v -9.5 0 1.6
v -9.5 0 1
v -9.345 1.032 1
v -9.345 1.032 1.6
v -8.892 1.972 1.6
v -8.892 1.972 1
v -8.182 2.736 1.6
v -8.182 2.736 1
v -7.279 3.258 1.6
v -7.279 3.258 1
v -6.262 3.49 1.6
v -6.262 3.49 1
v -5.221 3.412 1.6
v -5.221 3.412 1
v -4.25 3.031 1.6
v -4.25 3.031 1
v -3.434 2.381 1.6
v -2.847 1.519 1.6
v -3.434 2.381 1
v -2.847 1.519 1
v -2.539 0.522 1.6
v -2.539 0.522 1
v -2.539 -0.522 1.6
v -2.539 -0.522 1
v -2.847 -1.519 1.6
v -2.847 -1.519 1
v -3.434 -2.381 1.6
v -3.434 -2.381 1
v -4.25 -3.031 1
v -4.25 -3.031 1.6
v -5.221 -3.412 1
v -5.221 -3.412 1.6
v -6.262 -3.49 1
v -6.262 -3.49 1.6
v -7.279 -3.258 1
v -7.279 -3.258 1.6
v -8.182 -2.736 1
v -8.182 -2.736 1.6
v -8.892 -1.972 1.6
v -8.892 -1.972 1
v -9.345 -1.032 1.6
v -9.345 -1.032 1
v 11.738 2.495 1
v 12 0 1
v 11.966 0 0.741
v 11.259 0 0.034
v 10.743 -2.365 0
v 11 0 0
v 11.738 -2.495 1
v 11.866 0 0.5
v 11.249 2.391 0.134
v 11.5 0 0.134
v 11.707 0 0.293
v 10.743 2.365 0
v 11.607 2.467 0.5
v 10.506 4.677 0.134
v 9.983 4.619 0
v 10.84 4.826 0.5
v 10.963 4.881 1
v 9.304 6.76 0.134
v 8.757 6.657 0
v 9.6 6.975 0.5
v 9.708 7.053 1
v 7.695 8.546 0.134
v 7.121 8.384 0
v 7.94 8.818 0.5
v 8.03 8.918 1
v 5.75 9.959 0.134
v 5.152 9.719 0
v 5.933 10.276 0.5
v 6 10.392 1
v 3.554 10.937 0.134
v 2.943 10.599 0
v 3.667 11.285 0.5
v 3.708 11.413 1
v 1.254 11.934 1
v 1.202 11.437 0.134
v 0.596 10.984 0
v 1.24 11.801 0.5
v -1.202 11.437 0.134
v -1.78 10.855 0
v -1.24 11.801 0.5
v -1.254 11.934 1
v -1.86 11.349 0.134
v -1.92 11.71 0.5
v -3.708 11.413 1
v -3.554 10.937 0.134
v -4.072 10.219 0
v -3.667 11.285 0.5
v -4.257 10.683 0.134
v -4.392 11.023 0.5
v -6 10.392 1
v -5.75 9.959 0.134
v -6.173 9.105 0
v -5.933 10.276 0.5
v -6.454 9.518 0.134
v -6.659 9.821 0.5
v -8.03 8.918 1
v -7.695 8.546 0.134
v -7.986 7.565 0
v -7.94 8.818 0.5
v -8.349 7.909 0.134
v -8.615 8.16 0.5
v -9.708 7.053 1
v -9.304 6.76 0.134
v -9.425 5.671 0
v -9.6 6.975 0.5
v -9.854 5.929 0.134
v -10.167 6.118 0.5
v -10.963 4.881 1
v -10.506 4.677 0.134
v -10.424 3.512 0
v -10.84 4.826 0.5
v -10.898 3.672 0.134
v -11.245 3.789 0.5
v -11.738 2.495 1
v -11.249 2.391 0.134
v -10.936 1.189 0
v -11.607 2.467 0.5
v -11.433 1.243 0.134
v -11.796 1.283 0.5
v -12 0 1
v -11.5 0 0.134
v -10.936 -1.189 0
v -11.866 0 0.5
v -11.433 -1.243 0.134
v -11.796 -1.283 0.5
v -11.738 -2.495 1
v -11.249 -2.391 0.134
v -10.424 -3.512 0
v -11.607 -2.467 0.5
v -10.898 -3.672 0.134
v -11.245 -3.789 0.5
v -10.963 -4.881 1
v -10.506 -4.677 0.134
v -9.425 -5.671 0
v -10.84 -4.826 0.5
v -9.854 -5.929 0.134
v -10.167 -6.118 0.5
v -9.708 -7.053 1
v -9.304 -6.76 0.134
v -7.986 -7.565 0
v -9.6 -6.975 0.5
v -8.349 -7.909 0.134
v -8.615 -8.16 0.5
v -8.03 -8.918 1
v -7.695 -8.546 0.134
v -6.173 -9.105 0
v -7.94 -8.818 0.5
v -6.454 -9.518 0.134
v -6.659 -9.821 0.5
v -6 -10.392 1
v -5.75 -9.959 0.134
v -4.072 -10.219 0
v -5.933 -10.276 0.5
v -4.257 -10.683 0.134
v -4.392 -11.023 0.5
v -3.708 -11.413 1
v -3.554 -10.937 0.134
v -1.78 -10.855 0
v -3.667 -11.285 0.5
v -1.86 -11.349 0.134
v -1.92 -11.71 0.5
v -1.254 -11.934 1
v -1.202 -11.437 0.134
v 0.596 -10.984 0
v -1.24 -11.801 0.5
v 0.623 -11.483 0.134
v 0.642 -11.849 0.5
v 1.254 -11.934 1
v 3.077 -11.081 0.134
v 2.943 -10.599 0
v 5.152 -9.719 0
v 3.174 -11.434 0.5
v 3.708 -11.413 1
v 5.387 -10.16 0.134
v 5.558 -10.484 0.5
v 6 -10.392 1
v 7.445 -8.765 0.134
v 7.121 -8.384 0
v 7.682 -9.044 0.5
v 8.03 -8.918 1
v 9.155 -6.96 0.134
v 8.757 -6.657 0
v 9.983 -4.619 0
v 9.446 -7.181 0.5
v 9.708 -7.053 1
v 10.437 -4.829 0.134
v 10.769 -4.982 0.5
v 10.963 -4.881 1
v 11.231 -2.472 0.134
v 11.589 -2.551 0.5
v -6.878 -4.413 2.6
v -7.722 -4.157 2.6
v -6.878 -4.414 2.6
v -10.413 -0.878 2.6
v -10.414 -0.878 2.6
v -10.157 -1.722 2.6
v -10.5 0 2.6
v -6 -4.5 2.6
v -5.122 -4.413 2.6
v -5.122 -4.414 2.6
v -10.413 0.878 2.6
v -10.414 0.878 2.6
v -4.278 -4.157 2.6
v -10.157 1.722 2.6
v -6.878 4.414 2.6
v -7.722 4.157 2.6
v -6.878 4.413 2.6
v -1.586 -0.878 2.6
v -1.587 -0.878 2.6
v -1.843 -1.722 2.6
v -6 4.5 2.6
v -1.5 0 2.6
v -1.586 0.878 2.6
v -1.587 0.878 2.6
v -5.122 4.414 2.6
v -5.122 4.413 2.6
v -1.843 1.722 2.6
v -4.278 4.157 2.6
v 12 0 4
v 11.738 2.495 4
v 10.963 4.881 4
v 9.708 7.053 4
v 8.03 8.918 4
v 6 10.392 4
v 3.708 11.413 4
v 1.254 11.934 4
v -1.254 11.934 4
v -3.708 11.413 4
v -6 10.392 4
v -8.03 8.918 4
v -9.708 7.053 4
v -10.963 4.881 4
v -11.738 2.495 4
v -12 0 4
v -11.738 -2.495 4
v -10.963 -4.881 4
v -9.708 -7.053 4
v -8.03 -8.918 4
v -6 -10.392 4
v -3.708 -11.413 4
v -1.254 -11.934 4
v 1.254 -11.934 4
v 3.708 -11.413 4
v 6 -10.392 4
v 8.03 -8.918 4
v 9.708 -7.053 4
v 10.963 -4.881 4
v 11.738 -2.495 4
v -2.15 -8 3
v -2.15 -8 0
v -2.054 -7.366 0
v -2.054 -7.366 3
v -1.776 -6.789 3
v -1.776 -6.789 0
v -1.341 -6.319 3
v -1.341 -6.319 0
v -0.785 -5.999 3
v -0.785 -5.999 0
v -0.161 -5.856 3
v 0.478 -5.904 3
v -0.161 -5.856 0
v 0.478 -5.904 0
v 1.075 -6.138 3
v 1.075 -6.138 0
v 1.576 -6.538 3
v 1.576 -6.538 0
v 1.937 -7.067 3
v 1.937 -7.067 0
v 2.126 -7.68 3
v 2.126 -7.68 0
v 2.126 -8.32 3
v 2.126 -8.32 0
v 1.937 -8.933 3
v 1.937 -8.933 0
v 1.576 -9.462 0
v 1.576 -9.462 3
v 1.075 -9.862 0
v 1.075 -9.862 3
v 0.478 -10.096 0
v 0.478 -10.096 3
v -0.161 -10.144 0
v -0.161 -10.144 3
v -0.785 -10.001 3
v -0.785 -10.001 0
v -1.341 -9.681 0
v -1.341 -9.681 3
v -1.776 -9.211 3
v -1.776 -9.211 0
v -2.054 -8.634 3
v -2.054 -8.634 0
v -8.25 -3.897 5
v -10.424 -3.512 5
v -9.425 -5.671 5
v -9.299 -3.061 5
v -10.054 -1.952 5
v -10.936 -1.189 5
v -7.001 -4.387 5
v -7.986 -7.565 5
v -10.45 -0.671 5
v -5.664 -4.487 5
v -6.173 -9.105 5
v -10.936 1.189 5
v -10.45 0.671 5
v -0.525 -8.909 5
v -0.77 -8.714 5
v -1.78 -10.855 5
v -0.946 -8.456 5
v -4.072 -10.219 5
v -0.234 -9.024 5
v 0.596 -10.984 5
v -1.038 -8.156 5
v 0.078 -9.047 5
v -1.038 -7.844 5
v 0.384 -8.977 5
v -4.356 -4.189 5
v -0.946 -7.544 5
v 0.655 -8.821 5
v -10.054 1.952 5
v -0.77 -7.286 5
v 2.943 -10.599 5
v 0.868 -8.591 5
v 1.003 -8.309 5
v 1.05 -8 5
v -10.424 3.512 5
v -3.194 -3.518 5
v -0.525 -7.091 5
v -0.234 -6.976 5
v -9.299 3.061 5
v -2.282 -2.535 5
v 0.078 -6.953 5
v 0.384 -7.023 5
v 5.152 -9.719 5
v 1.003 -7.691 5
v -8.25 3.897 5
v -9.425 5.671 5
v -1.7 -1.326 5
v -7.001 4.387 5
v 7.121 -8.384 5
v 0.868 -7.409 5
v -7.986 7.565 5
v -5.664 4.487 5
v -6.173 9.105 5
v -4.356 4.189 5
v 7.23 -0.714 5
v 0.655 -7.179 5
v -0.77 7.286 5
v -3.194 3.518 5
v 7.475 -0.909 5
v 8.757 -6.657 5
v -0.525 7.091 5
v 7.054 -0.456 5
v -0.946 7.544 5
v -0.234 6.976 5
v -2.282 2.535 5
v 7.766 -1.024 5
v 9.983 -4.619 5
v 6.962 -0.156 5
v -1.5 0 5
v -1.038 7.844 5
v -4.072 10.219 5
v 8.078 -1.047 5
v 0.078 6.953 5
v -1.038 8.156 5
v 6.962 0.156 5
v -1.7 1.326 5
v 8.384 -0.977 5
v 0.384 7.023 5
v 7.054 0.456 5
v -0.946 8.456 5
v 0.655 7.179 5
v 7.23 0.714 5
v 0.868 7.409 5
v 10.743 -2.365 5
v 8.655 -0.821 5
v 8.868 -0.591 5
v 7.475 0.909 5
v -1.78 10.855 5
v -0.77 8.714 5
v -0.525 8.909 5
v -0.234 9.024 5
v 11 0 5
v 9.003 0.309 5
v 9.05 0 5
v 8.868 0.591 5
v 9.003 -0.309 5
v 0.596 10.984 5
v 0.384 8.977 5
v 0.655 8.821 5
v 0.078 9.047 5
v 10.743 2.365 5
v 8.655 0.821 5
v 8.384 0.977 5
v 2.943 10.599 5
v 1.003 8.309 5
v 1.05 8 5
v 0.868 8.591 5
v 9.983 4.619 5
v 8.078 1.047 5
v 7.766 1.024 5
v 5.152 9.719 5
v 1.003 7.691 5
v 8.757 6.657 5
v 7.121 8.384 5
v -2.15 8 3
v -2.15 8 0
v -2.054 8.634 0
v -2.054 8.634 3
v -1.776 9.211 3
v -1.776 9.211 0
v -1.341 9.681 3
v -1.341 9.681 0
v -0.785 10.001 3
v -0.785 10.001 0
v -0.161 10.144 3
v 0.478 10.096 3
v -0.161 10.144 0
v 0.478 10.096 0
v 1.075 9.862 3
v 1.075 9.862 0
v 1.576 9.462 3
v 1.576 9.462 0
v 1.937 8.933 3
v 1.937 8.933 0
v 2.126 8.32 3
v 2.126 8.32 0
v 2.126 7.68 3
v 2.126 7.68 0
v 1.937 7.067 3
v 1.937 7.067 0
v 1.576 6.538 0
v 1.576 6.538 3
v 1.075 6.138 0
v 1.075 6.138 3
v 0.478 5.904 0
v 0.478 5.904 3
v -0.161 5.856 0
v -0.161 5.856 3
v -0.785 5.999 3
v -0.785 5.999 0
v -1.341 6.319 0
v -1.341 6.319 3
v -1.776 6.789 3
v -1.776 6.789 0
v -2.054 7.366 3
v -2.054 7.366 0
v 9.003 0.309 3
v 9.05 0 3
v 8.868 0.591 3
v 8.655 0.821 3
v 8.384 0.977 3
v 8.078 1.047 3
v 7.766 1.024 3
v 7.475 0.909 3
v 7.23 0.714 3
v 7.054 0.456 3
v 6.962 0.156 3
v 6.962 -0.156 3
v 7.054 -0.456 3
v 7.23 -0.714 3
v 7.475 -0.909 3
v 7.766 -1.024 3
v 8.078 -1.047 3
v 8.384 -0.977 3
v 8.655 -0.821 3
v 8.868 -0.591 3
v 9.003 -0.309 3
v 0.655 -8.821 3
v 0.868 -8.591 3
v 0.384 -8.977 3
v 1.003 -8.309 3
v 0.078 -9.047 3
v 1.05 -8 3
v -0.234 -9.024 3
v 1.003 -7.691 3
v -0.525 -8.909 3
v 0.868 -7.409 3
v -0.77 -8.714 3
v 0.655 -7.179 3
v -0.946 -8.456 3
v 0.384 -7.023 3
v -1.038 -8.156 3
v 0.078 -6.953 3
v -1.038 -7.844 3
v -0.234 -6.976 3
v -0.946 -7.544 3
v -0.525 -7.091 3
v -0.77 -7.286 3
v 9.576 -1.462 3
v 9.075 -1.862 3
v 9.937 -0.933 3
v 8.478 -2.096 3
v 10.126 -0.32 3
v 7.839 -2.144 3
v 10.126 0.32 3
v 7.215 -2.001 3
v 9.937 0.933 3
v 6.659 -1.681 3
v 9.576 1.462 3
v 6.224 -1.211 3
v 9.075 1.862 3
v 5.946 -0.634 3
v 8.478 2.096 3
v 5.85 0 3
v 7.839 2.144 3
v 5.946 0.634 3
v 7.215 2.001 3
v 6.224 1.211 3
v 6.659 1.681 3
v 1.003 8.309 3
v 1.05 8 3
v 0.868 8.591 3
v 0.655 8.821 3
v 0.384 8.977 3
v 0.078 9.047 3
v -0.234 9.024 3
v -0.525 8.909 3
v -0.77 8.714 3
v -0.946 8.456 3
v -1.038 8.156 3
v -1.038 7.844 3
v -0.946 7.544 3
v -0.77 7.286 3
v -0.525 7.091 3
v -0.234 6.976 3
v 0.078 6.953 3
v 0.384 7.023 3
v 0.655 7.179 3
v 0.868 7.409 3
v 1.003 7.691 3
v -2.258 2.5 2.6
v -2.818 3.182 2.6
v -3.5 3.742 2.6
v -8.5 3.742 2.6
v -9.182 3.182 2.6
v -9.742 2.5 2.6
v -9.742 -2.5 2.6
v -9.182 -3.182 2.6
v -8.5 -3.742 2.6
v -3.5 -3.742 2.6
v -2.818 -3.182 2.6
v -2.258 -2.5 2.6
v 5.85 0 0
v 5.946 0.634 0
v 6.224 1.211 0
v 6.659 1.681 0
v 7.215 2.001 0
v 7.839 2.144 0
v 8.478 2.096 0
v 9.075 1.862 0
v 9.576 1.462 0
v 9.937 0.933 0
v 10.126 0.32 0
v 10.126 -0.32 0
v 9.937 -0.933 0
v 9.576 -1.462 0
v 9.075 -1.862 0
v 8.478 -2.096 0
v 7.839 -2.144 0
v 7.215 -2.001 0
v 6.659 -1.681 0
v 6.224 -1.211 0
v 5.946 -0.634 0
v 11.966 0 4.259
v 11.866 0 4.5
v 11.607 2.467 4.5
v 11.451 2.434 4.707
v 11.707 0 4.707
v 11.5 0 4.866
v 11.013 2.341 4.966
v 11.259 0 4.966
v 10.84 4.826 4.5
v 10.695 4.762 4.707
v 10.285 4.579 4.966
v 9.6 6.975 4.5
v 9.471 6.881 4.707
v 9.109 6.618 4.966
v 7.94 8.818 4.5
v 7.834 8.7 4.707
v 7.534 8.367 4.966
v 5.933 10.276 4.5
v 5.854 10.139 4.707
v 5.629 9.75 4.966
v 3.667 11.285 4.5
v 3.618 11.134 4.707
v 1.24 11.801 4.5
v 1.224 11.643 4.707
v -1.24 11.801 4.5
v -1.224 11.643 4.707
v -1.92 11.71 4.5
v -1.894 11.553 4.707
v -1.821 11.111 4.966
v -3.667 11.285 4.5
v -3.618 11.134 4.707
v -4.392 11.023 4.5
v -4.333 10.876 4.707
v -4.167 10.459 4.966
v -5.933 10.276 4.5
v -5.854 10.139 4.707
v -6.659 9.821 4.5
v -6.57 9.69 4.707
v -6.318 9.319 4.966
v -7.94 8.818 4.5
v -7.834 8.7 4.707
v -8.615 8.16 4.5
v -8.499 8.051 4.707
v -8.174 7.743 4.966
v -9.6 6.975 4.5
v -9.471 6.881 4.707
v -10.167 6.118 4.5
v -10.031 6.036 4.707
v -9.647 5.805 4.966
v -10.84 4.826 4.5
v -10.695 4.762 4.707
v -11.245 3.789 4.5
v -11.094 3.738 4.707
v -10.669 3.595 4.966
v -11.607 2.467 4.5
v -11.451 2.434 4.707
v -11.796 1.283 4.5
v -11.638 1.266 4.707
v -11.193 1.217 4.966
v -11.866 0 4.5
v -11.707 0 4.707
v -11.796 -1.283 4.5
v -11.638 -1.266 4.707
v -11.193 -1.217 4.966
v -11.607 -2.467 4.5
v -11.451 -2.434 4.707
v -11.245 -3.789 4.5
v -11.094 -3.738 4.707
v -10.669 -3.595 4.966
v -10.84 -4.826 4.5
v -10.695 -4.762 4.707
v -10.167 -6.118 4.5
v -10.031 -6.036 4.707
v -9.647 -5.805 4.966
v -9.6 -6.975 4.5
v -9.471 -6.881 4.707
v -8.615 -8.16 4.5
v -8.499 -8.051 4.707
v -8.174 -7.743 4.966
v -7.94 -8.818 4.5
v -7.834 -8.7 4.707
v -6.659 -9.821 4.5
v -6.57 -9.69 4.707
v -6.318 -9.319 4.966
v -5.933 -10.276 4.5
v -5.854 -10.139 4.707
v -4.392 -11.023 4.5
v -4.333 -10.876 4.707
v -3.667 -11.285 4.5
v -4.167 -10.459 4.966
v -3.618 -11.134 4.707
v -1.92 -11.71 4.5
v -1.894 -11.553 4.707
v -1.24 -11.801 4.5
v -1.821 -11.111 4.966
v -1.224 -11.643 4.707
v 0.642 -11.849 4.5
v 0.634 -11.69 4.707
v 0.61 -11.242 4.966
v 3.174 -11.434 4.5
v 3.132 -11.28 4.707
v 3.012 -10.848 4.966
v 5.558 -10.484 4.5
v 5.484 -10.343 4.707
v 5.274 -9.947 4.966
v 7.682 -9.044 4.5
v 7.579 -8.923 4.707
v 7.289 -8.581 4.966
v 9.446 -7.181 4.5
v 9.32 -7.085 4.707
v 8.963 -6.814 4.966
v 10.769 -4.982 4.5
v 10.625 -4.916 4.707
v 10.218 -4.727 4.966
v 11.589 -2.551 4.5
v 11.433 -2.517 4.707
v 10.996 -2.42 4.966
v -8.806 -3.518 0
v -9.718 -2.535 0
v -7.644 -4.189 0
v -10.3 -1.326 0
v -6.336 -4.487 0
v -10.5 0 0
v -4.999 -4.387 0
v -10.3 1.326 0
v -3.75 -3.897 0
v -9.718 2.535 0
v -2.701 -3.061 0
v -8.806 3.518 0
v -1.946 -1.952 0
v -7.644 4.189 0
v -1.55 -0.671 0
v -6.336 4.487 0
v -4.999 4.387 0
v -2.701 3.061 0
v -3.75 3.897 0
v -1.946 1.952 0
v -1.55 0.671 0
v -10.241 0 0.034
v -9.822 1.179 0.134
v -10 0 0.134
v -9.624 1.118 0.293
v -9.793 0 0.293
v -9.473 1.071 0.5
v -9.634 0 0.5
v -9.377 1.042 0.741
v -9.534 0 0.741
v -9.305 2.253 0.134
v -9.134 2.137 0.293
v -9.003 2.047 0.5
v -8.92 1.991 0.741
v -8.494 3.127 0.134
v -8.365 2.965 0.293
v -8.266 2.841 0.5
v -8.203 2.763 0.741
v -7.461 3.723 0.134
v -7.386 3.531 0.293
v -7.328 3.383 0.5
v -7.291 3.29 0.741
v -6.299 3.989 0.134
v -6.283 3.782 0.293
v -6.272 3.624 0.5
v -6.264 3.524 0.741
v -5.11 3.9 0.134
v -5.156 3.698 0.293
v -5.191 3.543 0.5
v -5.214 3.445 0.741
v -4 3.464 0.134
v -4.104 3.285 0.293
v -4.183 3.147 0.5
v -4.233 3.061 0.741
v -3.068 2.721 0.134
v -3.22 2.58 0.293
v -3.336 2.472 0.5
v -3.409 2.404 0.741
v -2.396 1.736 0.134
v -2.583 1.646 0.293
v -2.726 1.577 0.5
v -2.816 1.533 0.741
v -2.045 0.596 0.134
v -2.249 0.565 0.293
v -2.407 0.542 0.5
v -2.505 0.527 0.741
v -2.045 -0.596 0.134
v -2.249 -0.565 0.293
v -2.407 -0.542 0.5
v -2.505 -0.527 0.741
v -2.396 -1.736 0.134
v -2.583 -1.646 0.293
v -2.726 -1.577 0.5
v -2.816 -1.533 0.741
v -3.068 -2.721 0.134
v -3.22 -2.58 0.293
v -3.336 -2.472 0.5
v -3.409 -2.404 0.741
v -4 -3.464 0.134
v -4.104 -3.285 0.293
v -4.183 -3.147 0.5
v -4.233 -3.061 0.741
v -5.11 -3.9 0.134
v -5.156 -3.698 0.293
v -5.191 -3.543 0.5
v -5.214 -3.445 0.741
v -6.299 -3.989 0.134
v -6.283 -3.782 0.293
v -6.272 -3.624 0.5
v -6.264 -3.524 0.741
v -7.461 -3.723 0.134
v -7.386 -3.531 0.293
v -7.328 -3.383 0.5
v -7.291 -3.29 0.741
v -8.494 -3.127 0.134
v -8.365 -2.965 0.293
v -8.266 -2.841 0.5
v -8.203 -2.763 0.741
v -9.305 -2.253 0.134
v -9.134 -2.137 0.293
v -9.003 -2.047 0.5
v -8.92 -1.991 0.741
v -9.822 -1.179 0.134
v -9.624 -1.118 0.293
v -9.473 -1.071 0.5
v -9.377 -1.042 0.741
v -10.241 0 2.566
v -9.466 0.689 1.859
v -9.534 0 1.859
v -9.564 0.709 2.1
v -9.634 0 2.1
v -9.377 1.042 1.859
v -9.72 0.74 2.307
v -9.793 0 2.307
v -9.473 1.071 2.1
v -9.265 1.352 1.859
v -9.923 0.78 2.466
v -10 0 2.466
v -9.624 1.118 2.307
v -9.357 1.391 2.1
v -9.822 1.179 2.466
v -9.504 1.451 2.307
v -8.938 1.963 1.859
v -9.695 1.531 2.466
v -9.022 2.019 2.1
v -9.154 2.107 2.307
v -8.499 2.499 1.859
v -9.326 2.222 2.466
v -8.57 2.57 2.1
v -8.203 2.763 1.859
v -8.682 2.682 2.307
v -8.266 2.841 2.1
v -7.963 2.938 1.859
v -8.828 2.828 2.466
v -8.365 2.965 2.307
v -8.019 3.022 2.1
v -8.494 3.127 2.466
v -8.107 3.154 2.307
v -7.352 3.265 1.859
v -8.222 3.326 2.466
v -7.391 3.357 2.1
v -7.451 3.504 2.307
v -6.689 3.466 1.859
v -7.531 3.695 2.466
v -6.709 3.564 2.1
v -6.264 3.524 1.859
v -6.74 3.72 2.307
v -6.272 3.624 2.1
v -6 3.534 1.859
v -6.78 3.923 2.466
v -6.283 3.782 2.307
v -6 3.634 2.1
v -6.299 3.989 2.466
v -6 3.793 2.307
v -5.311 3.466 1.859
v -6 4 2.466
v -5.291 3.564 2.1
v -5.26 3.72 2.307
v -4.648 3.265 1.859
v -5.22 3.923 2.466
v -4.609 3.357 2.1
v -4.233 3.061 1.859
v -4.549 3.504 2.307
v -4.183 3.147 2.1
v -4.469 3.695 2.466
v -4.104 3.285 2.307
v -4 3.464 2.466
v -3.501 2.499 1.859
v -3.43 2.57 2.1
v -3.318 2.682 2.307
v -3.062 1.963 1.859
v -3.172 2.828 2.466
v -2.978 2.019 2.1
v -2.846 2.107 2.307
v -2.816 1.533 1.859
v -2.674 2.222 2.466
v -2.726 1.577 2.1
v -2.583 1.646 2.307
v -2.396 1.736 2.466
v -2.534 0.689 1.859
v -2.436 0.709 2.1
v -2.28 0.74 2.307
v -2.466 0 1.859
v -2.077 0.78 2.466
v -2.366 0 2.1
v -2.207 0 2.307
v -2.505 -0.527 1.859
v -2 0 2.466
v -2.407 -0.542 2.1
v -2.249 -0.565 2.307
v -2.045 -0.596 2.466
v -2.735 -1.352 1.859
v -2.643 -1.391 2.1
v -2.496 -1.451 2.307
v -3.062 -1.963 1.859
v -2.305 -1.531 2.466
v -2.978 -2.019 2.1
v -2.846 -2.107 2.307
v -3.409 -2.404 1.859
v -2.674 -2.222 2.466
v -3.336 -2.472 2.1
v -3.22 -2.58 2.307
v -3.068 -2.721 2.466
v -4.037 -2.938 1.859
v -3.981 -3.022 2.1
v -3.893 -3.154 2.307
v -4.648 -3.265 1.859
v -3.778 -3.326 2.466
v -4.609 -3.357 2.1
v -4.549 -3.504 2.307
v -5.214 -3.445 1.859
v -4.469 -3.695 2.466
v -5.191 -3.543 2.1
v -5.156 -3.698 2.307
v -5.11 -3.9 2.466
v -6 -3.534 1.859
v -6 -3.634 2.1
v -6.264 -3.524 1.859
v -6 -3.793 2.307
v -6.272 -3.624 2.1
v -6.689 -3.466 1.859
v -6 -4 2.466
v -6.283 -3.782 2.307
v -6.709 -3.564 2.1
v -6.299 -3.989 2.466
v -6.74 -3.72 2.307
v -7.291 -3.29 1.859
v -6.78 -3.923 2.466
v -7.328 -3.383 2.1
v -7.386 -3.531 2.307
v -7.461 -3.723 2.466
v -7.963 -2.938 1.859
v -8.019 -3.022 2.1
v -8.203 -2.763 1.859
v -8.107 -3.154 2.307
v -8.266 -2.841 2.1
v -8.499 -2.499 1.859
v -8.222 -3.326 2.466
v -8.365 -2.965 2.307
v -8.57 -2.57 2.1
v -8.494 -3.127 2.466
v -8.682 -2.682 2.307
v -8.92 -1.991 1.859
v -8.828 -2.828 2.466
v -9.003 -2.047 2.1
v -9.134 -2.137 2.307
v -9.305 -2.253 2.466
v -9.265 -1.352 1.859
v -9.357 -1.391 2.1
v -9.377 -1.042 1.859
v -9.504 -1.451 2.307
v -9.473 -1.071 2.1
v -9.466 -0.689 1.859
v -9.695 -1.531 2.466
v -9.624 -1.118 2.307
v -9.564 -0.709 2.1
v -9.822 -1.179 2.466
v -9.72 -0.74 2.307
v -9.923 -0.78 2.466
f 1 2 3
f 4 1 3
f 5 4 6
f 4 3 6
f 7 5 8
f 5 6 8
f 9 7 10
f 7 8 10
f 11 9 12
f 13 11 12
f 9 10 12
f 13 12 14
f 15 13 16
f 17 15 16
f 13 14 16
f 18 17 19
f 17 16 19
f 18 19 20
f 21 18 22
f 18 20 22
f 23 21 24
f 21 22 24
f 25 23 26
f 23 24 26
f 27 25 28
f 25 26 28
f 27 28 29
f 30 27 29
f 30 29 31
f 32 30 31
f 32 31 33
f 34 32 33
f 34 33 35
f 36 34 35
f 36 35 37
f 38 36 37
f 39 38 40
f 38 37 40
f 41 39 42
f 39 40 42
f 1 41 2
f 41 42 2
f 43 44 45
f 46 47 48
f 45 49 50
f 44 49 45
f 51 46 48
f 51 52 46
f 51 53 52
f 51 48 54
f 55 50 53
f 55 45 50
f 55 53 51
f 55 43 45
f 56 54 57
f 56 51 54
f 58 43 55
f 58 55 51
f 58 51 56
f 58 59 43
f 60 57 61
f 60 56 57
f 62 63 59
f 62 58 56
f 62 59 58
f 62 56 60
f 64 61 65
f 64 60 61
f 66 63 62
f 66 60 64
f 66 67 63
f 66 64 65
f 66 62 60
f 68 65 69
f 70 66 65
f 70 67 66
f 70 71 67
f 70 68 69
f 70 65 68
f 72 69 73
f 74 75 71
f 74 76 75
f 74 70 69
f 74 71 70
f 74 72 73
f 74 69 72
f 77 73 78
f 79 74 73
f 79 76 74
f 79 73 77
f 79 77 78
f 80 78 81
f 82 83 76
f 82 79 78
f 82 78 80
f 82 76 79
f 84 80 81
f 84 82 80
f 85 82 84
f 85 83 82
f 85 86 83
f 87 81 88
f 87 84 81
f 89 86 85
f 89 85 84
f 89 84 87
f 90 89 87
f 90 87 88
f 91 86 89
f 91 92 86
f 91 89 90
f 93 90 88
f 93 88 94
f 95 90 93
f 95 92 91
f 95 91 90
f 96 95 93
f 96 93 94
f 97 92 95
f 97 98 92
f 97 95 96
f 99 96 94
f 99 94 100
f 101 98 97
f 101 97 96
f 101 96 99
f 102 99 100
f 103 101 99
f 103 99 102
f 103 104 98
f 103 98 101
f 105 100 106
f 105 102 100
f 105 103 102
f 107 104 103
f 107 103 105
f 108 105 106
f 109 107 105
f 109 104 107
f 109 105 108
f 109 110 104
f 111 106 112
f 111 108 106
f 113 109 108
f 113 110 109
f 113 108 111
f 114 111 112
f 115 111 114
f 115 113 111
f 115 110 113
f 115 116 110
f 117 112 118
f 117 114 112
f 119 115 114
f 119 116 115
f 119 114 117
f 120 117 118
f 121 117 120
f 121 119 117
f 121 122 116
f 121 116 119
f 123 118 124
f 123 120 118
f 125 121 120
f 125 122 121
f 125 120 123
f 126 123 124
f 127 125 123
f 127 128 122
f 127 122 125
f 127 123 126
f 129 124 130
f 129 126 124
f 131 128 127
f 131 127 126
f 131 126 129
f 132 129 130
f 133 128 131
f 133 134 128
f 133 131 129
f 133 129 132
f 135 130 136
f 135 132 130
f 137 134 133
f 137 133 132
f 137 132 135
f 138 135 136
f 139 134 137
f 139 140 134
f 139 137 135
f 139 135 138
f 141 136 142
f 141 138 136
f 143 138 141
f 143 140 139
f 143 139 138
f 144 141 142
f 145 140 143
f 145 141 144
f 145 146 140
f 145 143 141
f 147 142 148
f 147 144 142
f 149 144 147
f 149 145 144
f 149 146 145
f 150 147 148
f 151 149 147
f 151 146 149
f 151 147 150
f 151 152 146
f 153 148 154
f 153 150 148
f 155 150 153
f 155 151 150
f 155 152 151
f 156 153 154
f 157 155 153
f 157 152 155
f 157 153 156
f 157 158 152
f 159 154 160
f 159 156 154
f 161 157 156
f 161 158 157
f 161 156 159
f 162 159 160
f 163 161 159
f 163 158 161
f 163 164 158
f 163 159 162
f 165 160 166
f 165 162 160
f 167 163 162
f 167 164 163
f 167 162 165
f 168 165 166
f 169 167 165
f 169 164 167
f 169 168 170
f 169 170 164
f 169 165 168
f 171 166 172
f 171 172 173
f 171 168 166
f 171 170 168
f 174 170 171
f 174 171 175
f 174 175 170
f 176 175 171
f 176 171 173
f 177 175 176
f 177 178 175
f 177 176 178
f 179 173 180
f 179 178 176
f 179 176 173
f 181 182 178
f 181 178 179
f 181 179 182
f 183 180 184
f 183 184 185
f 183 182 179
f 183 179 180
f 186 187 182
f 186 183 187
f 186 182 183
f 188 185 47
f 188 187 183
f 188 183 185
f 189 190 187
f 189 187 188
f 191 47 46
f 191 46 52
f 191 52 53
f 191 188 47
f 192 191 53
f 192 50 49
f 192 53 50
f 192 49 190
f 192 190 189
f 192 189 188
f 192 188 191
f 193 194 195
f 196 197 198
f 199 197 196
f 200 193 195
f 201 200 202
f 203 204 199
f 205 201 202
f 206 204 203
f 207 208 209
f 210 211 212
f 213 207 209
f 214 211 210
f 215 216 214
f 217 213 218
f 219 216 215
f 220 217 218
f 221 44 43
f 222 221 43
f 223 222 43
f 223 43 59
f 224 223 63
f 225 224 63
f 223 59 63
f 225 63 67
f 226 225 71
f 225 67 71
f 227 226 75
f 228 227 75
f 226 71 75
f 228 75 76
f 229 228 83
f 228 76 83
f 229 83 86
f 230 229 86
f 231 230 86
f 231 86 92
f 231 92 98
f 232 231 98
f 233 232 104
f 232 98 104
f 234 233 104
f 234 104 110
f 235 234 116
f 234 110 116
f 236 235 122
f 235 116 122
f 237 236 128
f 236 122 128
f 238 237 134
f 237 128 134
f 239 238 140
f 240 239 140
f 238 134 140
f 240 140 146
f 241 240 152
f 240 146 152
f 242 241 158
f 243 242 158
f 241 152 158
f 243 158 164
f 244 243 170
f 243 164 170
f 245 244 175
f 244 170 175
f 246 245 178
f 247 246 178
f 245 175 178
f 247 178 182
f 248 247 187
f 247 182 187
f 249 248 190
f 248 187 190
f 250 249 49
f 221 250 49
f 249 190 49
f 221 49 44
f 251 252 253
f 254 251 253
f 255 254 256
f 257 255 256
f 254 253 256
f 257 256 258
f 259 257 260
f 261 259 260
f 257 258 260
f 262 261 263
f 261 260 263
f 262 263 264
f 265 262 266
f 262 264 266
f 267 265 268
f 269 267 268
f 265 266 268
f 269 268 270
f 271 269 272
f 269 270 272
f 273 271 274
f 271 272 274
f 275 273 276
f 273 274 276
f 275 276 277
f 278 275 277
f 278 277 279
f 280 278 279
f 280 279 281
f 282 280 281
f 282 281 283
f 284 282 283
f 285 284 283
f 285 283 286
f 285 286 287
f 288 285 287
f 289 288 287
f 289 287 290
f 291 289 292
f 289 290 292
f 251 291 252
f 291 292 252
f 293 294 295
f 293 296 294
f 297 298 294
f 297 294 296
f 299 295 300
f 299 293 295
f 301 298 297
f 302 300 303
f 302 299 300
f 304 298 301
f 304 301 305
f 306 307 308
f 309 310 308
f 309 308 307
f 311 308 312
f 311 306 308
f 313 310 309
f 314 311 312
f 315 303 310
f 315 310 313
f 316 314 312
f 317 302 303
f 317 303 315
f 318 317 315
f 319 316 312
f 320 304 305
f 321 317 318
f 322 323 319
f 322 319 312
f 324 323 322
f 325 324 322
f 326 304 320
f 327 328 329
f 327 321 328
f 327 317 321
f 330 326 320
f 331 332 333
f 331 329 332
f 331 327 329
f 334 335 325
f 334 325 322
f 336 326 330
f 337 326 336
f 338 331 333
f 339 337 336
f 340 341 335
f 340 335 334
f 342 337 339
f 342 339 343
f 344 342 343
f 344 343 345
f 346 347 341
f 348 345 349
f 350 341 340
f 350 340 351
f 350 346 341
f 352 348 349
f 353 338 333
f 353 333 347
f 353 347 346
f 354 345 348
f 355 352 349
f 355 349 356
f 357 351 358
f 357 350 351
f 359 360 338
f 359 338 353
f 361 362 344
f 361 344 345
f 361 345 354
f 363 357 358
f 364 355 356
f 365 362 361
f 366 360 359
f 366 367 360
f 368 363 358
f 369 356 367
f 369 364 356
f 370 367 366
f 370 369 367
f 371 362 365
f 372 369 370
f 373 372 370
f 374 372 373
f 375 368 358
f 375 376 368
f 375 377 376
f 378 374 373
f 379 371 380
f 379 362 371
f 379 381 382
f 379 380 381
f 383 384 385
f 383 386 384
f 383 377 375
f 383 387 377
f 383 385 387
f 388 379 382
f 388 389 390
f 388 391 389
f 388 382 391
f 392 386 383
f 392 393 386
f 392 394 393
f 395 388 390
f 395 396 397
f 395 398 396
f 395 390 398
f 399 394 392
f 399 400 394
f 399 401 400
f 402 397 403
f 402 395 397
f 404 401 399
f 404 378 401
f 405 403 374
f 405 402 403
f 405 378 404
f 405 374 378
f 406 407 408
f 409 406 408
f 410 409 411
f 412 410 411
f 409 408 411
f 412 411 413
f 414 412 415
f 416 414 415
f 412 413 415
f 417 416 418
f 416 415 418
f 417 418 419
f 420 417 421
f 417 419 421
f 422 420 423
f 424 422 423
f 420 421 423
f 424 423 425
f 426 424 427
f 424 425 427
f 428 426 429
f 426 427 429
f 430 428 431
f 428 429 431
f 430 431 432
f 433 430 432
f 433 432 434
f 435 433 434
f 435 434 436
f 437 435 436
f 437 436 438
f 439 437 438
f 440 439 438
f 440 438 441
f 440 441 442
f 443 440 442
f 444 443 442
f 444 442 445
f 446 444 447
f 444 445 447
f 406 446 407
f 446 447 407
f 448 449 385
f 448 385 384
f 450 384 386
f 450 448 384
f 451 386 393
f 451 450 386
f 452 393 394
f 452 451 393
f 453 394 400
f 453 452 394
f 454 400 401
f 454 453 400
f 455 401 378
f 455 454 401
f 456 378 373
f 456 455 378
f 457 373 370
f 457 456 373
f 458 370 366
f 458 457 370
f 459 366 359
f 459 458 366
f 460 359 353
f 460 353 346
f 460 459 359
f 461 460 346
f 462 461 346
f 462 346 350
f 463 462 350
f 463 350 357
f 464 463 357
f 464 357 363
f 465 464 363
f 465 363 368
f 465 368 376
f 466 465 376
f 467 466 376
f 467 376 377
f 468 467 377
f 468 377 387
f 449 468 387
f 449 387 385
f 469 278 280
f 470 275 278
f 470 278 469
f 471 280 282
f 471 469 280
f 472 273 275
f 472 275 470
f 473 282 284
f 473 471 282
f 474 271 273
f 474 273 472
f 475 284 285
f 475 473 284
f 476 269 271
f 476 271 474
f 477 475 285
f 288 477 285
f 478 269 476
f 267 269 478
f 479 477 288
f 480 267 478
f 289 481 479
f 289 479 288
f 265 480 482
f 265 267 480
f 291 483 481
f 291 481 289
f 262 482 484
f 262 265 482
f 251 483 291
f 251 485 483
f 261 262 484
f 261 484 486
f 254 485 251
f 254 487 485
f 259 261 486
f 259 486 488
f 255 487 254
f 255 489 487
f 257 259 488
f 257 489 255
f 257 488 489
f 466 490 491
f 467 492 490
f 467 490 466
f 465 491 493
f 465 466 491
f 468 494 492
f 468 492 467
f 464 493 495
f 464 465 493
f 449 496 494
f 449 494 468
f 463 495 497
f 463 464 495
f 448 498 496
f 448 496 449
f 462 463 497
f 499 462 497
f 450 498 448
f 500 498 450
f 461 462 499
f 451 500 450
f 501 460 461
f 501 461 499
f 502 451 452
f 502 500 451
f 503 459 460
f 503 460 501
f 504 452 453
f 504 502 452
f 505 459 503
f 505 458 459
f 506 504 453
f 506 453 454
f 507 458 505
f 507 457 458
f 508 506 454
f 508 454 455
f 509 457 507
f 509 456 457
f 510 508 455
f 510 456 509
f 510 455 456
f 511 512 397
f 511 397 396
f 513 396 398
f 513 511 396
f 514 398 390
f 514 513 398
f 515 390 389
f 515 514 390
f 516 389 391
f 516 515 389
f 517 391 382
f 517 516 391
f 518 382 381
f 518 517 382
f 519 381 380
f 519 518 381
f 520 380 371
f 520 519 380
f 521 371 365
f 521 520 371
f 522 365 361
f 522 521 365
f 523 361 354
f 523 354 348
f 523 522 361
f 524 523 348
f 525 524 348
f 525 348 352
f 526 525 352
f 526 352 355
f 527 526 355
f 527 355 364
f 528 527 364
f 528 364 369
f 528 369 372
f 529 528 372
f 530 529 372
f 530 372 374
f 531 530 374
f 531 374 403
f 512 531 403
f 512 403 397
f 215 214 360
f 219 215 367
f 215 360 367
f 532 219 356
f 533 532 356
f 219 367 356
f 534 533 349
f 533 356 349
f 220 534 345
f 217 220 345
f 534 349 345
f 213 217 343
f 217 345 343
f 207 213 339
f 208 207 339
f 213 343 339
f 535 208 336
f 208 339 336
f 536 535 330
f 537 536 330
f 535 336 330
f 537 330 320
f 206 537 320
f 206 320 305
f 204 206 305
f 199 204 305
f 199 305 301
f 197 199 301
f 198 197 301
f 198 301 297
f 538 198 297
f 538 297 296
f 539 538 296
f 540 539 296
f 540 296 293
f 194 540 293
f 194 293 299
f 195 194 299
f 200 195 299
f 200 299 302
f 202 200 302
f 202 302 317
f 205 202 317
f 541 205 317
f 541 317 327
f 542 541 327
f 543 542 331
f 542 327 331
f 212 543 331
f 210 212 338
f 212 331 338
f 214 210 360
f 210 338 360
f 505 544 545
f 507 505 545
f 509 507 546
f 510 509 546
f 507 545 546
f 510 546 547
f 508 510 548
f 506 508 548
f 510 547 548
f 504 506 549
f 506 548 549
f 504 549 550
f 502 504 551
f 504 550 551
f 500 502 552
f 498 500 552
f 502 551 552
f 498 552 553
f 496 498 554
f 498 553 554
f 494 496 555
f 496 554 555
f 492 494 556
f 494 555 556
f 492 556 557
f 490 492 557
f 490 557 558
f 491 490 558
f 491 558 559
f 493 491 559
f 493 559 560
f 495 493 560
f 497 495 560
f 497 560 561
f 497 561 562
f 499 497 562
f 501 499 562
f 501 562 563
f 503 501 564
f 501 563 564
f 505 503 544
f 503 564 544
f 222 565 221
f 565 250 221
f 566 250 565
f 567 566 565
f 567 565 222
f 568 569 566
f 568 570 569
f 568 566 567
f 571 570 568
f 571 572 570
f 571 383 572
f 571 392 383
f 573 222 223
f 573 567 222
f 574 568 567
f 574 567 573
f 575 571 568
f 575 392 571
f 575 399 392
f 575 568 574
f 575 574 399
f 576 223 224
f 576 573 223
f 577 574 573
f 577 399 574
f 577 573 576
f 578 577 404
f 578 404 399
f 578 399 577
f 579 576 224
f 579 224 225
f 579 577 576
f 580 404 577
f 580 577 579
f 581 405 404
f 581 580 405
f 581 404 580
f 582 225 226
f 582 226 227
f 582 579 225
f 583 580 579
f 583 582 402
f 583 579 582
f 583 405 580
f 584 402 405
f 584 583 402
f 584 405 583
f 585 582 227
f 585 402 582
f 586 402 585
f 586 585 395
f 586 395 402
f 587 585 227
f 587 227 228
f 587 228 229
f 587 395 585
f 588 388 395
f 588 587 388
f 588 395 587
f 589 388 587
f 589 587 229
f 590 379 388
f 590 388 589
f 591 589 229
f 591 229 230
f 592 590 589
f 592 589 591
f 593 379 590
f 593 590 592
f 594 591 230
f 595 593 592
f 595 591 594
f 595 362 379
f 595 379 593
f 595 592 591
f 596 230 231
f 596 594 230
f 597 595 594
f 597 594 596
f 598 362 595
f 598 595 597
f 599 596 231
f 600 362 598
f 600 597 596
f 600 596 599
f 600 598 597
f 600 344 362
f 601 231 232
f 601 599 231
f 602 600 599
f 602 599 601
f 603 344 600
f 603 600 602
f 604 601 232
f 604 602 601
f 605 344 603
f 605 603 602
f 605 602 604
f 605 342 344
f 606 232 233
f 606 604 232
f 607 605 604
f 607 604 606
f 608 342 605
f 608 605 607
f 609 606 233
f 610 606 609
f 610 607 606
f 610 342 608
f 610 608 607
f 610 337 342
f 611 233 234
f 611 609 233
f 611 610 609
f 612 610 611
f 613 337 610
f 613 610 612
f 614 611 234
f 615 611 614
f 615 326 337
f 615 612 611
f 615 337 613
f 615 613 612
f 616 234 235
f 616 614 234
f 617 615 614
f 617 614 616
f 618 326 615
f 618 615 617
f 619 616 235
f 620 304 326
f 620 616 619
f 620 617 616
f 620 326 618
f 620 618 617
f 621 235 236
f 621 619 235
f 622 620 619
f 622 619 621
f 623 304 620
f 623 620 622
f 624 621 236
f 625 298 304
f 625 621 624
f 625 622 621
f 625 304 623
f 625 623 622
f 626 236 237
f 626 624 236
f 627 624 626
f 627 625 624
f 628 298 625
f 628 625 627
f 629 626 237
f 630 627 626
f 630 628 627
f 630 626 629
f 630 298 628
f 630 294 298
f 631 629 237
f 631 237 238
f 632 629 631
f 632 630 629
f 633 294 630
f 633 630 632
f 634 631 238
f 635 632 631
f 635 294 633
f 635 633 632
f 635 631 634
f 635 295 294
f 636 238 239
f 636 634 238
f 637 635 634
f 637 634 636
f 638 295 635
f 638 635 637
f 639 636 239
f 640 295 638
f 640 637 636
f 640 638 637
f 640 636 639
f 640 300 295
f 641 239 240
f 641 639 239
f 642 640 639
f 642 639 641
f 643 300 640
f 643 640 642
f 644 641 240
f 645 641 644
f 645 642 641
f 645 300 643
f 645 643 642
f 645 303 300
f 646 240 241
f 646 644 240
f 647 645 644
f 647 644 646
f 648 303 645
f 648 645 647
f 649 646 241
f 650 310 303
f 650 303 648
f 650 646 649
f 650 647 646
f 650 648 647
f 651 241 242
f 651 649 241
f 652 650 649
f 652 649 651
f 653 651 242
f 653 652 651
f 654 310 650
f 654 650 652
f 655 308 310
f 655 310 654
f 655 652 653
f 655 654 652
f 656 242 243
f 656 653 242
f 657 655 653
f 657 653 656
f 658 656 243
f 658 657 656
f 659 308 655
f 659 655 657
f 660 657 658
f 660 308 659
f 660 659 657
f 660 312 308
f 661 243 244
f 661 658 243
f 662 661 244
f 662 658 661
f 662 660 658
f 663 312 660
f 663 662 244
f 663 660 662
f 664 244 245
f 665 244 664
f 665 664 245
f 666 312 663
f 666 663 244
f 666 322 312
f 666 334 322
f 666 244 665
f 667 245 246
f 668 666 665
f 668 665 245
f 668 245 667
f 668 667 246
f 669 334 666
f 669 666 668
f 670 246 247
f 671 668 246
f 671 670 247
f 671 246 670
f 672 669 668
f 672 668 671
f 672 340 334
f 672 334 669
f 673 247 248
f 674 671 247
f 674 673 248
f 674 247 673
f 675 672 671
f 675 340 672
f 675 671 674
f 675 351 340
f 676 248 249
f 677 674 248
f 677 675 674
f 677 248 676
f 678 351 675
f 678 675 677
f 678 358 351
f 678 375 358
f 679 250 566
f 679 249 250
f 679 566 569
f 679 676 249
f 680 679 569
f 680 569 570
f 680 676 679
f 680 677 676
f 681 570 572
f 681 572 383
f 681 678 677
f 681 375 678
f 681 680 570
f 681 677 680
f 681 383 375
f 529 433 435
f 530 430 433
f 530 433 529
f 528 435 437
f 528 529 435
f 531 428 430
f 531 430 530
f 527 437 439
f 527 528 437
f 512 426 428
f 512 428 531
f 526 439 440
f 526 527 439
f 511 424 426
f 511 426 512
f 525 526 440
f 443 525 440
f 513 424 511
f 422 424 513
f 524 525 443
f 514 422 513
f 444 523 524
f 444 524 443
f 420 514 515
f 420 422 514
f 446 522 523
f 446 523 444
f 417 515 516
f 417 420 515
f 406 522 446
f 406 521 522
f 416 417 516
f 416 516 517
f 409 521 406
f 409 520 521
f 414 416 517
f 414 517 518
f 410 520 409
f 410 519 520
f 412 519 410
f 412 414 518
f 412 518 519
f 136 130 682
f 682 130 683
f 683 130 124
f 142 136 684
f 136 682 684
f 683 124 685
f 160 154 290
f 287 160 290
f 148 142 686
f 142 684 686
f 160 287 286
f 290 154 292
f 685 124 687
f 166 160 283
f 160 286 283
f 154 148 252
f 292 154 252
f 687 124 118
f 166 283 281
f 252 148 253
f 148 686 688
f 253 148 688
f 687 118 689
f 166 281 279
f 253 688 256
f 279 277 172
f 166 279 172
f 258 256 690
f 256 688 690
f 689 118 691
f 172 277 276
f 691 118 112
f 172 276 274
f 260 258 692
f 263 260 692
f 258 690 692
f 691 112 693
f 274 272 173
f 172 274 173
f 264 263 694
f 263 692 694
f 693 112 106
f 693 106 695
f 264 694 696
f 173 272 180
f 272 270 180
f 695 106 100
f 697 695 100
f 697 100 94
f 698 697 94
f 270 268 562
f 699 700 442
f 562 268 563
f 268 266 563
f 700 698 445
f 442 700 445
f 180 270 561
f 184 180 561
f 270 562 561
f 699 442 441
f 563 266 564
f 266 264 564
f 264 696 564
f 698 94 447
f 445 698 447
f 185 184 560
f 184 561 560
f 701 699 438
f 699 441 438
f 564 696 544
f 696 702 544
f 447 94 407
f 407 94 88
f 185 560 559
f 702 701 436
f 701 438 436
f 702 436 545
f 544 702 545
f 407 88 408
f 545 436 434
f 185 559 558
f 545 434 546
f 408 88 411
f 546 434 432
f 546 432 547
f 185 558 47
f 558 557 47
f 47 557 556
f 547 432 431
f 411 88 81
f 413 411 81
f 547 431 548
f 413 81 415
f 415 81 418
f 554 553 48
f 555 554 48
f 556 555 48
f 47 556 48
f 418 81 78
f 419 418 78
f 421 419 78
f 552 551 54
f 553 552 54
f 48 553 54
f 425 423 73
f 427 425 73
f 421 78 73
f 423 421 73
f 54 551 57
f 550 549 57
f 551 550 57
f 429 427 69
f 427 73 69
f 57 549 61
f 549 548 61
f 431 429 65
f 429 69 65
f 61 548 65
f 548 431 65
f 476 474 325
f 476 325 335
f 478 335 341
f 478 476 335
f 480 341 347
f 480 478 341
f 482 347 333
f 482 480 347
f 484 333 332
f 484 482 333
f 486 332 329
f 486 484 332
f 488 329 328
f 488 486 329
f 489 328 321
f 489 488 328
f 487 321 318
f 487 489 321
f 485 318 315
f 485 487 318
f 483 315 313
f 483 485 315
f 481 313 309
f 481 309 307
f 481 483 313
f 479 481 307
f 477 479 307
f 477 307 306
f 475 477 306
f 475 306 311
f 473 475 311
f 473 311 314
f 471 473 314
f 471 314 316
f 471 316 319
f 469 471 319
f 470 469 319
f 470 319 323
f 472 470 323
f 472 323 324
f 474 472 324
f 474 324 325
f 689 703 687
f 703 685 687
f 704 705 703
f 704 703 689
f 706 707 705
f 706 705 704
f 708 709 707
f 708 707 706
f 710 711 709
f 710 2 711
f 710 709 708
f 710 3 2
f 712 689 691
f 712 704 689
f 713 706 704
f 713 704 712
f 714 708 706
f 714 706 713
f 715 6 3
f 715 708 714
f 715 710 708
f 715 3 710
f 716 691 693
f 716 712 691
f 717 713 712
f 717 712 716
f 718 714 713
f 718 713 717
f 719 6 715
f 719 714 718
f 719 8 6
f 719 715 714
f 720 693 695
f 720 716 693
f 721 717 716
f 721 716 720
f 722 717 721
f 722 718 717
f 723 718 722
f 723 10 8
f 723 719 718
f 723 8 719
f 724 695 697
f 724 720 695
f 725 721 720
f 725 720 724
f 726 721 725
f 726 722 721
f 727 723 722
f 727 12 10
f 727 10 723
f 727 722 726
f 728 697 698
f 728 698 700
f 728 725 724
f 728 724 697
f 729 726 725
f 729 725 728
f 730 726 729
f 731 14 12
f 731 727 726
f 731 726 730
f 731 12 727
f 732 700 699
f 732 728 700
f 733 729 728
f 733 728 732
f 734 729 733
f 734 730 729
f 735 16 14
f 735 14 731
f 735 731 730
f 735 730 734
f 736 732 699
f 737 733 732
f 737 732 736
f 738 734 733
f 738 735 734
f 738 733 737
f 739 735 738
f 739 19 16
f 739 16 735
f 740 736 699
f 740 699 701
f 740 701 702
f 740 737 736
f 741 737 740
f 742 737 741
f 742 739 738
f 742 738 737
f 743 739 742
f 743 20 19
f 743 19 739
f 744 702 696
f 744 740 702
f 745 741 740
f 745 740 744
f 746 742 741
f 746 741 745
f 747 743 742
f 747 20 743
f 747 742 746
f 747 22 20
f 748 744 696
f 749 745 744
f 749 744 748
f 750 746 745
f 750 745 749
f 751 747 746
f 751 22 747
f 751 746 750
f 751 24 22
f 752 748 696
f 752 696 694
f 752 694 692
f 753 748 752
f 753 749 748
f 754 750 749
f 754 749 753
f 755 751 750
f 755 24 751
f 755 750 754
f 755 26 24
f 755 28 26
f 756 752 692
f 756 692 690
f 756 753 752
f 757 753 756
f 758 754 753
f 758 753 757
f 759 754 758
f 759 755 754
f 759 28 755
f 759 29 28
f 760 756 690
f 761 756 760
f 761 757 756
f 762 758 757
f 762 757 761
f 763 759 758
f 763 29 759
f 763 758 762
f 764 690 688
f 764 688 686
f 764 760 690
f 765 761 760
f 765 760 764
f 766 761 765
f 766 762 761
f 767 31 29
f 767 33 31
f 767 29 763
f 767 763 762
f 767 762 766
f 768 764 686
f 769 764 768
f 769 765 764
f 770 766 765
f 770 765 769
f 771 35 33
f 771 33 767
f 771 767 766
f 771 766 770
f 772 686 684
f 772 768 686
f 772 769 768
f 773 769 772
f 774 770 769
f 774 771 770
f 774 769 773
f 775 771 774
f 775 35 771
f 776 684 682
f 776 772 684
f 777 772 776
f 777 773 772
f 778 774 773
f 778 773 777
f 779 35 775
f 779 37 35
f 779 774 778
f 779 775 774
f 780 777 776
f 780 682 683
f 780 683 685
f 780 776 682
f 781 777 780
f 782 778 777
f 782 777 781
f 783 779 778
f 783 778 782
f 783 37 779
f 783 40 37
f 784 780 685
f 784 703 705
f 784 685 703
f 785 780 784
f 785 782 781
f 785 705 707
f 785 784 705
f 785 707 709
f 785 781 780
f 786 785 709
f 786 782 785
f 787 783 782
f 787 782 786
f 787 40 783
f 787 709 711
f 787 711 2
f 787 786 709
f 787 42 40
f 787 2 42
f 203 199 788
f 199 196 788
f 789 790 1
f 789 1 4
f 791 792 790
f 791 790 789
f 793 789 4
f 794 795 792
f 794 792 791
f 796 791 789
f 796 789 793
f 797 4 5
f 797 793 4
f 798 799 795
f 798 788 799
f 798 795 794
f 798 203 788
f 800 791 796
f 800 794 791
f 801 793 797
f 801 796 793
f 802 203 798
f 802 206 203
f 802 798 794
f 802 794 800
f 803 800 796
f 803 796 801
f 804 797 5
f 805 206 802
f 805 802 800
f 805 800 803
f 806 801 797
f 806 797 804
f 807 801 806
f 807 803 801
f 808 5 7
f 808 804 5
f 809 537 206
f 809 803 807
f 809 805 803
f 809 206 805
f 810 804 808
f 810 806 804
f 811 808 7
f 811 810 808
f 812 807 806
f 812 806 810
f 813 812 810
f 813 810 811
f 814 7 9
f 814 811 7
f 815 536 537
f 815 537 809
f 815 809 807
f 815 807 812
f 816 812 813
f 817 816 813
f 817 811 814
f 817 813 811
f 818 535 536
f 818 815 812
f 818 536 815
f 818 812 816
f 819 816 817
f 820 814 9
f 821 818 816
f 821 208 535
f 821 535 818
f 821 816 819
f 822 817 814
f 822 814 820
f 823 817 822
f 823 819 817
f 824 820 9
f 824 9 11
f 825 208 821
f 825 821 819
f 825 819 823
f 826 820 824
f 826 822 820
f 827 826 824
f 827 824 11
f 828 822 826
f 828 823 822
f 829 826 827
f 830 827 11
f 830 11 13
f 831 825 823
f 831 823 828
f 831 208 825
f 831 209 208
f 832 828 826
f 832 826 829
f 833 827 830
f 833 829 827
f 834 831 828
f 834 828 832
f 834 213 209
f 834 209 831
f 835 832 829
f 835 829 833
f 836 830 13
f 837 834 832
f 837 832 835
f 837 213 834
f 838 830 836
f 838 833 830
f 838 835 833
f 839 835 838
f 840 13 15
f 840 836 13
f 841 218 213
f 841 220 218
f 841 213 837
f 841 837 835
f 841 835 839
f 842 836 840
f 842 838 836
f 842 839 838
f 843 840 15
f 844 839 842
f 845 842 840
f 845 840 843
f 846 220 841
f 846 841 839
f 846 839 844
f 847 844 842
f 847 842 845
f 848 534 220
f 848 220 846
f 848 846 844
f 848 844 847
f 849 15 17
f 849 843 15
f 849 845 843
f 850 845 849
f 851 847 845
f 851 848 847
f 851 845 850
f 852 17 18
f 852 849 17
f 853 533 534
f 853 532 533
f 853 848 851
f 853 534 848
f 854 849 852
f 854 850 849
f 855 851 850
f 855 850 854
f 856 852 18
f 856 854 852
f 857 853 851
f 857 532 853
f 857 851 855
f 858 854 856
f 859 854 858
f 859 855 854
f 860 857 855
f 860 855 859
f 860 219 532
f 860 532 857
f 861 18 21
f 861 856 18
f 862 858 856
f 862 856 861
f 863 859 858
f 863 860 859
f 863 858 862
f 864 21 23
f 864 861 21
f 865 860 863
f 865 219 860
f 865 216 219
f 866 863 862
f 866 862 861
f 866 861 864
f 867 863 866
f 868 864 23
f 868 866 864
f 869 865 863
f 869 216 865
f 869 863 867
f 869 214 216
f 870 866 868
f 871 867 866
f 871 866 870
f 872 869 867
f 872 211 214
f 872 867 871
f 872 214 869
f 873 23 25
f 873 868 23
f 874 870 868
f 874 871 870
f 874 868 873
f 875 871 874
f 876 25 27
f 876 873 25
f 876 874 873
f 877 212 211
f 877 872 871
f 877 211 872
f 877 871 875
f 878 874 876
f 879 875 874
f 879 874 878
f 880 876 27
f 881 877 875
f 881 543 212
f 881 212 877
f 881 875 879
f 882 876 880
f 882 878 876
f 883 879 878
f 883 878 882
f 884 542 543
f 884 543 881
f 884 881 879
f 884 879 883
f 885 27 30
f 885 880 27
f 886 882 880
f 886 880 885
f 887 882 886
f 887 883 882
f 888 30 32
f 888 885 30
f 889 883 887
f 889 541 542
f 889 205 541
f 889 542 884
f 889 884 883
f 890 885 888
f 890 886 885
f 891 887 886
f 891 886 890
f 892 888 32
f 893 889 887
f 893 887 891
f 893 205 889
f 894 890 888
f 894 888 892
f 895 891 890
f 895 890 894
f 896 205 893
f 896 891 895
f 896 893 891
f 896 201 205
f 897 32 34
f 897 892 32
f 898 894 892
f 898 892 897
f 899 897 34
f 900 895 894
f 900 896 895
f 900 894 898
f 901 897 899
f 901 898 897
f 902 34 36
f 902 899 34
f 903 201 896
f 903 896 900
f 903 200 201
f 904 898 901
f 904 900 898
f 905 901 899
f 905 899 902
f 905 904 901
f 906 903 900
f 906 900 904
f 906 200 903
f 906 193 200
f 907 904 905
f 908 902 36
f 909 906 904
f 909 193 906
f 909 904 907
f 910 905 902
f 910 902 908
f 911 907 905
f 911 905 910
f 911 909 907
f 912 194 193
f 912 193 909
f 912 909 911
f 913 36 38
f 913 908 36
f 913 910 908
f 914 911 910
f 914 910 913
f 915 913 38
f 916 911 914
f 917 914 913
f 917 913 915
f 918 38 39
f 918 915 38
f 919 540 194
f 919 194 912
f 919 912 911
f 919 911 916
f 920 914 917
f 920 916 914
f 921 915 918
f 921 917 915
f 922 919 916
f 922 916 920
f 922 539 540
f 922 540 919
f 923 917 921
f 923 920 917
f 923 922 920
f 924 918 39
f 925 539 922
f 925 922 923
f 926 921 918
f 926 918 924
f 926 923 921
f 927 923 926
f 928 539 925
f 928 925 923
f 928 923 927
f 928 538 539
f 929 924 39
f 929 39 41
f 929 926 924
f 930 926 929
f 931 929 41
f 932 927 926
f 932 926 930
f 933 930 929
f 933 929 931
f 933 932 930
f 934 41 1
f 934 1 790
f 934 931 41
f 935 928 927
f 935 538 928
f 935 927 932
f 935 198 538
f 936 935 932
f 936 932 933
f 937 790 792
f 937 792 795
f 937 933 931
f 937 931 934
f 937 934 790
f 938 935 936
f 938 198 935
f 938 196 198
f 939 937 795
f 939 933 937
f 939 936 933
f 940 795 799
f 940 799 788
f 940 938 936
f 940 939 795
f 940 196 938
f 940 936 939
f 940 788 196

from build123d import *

# Parameters (mm, degrees)
SKETCH1_R           = 12
SKETCH1_R_2         = 1.05
BOSS_EXTRUDE1_DEPTH = 5
HOLE2_D             = 7
HOLE2_DEPTH         = 8
HOLE2_CBORE_D       = 9
HOLE2_CBORE_DEPTH   = 2.4
SKETCH8_R           = 2.15
CUT_EXTRUDE1_DEPTH  = 3
FILLET1_R           = 1
FILLET2_R           = 1


with BuildPart() as part:
    # Sketch1 → Boss-Extrude1 (new body)
    with BuildSketch(Plane.XY):
        Circle(SKETCH1_R)
        with Locations((0, 8)):
            Circle(SKETCH1_R_2, mode=Mode.SUBTRACT)
        with Locations((8, 0)):
            Circle(SKETCH1_R_2, mode=Mode.SUBTRACT)
        with Locations((0, -8)):
            Circle(SKETCH1_R_2, mode=Mode.SUBTRACT)
    extrude(amount=BOSS_EXTRUDE1_DEPTH)

    # Hole2
    with Locations(Plane.XY.offset(5)):
        with Locations((-6, 0)):
            CounterBoreHole(HOLE2_D / 2, HOLE2_CBORE_D / 2, HOLE2_CBORE_DEPTH, depth=HOLE2_DEPTH)

    # Sketch8 → Cut-Extrude1 (cut)
    with BuildSketch(Plane(origin=(0, 0, 0), x_dir=(-1, 0, 0), z_dir=(0, 0, -1))):
        with Locations((0, 8)):
            Circle(SKETCH8_R)
        with Locations((0, -8)):
            Circle(SKETCH8_R)
        with Locations((-8, 0)):
            Circle(SKETCH8_R)
    extrude(amount=-CUT_EXTRUDE1_DEPTH, mode=Mode.SUBTRACT)

    # Fillet1
    fillet1_edges = [part.edges().sort_by_distance(p)[0] for p in [
        (-2.5, 0, 0),
        (-2.5, 0, 2.6),
    ]]
    fillet(fillet1_edges, radius=FILLET1_R - 0.0001)  # a hair under: the kernel refuses the full size

    # Fillet2
    fillet2_edges = [part.edges().sort_by_distance(p)[0] for p in [
        (-12, 0, 0),
        (-12, 0, 5),
    ]]
    fillet(fillet2_edges, radius=FILLET2_R)


solid = part.part
